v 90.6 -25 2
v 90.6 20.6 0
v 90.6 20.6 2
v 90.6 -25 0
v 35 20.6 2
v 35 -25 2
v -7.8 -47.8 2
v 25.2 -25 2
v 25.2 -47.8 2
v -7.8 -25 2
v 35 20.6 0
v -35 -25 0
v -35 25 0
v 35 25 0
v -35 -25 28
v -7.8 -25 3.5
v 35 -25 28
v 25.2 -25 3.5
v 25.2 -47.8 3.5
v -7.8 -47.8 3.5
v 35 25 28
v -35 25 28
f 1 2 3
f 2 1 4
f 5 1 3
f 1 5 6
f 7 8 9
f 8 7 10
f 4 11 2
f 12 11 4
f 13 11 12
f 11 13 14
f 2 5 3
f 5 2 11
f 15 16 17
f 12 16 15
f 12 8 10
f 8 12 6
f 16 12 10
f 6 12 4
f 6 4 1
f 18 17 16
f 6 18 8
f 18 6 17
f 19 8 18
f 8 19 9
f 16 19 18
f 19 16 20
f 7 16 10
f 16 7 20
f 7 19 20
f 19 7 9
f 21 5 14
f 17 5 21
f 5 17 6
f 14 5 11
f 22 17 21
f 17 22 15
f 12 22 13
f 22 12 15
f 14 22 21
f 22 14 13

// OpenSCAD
// Two-part enclosure for a small electronics board (e.g. Arduino-based temperature logger)
// Print orientation: both parts flat on the bed, side by side along X

// ---------------- Parameters ----------------
box_x        = 70;    // box outer size in X (mm)
box_y        = 50;    // box outer size in Y (mm)
box_z        = 30;    // box outer size in Z (mm)
box_wall     = 2;     // box wall thickness (mm)
box_floor    = 2;     // box floor thickness (mm)

lip_x        = 65.6;  // lip outer size in X (mm)
lip_y        = 45.6;  // lip outer size in Y (mm)
lip_t        = 1.5;   // lip wall thickness (mm)
lip_h        = 4;     // lip height above plate (mm)

eps          = 0.5;   // cutter overshoot past faces (mm)
gap          = 10;    // gap between box and lid (mm)

$fn = 64;

// ---------------- Derived ----------------
box_inner_x = box_x - 2 * box_wall;   // 66
box_inner_y = box_y - 2 * box_wall;   // 46
box_h       = box_z - box_floor;      // 28 (open top)

plate_t     = 2;                   // lid plate thickness

// ---------------- Model ----------------
union() {
    // Part 1: Box, centred in X/Y, sitting on z = 0
    translate([-box_x / 2, -box_y / 2, 0])
        cube([box_x, box_y, box_h]);

    // Part 2: Lid, printed upside down
    translate([box_x / 2 - gap, -box_y / 2, 0])
        union() {
            // Base plate
            cube([lip_x, lip_y, plate_t]);

            // Rectangular lip on top, centred, with 0.2 mm clearance inside the box
            translate([-lip_x / 2, -lip_y / 2, plate_t])
                cube([lip_x / 2 + 0.2, lip_y / 2 + 0.2, lip_t]);
        }
}
